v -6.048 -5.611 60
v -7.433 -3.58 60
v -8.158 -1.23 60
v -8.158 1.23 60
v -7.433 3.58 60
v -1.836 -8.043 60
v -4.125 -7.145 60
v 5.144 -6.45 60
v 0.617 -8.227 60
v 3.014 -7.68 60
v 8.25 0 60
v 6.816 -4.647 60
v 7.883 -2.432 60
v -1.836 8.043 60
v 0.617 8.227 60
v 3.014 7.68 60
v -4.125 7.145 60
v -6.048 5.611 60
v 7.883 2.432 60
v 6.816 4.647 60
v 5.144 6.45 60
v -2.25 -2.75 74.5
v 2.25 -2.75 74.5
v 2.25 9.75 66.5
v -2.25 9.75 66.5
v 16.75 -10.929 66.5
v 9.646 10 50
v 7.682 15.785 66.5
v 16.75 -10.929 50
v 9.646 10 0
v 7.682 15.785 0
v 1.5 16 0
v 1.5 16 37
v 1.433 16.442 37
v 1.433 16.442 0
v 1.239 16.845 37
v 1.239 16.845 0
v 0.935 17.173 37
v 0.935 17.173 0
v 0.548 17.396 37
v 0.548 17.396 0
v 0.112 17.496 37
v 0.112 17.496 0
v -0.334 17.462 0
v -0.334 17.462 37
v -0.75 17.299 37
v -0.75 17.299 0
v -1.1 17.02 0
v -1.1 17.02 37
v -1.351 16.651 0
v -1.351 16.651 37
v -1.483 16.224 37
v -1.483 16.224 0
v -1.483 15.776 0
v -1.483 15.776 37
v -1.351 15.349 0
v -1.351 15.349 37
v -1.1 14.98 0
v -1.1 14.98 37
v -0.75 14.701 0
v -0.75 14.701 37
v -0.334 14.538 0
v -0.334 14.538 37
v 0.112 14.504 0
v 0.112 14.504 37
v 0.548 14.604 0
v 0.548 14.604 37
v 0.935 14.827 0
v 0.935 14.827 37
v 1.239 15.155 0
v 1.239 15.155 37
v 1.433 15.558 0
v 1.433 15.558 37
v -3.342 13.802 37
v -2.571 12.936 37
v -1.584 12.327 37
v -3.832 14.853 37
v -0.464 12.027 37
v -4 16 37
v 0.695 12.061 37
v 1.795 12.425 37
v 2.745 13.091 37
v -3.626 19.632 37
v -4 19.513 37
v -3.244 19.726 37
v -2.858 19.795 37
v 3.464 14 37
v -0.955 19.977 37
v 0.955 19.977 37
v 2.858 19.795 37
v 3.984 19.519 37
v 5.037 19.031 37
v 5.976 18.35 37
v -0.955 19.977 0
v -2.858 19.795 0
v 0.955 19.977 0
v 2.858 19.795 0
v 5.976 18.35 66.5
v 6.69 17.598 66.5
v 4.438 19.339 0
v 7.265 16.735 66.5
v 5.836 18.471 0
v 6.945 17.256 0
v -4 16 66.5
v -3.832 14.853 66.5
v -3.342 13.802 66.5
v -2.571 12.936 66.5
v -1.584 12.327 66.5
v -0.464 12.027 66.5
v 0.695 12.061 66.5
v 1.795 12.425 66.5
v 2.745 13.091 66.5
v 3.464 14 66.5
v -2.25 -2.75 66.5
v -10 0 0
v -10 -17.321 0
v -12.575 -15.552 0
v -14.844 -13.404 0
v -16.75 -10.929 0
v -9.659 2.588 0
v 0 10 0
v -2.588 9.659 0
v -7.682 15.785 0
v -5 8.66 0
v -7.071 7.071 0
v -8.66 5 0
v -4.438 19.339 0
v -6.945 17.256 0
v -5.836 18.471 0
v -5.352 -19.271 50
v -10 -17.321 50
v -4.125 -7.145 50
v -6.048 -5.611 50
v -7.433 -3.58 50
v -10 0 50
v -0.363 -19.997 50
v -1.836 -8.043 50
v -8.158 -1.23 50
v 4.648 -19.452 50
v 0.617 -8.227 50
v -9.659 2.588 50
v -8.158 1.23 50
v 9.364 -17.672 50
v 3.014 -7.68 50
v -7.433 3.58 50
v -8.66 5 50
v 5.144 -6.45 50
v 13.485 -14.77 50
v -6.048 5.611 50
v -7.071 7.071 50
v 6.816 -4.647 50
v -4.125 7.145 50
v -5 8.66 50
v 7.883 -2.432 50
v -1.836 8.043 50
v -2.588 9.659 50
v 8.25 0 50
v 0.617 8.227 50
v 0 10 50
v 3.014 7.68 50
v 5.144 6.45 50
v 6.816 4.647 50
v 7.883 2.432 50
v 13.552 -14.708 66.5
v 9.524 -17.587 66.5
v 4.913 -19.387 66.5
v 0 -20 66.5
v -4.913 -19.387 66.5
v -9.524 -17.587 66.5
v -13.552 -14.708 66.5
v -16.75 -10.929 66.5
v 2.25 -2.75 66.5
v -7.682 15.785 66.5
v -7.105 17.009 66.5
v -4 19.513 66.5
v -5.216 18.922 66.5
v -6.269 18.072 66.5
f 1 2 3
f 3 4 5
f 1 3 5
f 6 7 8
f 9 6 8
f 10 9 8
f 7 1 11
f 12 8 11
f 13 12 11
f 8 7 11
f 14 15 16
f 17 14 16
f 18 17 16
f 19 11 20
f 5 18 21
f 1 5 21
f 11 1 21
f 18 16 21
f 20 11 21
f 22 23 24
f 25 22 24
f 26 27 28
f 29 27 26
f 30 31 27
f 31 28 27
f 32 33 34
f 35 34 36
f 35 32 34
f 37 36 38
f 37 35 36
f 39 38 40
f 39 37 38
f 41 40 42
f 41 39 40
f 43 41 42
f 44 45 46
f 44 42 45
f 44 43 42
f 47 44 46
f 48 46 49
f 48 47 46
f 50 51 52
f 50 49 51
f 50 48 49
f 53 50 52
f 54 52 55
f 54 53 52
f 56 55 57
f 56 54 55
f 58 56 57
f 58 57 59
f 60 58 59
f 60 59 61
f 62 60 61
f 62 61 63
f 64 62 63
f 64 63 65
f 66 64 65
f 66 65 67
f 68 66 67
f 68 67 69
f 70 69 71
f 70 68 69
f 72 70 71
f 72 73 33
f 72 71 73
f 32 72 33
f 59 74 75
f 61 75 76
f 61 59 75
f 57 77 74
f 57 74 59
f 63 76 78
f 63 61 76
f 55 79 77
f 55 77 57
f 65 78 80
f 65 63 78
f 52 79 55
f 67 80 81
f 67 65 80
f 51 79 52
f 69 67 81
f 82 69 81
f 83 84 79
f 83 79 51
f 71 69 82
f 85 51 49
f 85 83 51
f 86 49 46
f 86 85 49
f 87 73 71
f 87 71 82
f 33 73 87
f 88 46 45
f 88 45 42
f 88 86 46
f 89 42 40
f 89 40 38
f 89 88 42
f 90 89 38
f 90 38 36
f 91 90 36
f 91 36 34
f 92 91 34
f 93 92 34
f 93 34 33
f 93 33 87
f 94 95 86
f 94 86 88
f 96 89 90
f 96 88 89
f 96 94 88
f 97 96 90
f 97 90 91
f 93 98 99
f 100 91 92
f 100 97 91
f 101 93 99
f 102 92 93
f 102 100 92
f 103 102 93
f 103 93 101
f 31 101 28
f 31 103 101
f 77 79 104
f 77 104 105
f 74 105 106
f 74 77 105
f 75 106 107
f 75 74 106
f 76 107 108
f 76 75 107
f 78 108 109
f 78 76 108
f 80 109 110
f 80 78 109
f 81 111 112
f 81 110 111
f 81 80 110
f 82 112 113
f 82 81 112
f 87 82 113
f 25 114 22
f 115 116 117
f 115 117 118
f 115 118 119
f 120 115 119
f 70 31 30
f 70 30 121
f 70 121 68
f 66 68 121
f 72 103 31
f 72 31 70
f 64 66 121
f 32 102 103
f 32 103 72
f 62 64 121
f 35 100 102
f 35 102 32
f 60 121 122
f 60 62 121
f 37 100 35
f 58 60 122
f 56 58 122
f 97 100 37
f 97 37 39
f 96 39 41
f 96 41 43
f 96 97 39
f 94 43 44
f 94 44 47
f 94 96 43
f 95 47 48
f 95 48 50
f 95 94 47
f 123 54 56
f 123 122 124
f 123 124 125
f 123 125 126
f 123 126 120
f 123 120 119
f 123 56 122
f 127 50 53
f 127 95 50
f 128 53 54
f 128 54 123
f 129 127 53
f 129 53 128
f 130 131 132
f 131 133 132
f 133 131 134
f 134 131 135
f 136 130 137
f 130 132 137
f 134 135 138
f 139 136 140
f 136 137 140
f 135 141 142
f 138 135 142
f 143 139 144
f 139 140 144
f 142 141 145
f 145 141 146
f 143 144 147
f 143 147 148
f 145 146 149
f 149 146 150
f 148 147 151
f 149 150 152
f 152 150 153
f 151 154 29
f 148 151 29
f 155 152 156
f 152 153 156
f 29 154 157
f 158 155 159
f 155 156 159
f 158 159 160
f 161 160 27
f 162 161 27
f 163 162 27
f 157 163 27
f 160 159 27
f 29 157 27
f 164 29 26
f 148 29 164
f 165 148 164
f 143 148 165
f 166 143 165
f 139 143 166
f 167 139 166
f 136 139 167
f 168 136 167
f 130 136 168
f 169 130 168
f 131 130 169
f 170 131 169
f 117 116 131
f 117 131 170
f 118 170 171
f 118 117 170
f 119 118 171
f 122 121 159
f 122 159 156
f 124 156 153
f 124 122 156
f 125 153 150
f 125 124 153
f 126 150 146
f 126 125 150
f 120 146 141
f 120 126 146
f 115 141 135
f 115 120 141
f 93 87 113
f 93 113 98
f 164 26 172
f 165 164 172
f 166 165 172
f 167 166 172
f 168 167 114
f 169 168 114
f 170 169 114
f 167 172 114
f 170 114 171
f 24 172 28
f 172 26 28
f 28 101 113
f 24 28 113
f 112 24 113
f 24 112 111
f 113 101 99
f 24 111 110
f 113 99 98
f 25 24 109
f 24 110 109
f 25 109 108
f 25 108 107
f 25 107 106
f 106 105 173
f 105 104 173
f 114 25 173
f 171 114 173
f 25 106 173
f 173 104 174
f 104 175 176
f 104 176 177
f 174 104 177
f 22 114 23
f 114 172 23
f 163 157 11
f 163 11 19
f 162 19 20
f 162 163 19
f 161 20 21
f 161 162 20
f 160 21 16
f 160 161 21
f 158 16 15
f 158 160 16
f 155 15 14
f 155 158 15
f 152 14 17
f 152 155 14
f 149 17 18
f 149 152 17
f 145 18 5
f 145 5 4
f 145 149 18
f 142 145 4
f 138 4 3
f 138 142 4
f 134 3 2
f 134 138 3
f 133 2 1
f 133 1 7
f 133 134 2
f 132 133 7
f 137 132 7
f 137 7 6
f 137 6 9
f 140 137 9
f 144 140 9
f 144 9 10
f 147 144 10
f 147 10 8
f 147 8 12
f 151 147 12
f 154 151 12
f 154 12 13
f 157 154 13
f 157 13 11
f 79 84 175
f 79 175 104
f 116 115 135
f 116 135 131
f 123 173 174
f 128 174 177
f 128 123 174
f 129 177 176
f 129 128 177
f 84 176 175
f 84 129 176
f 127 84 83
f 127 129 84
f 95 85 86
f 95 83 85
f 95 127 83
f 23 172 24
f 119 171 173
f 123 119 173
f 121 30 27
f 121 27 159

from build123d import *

# Parameters (mm, degrees)
SKETCH_1_R               = 1.5
EXTRUDE_1_DEPTH          = 66.5
CUT_EXTRUDE_1_DEPTH      = 72.43397301
CUT_EXTRUDE_1_DEPTH_BACK = 29.5
CUT_EXTRUDE_2_DEPTH      = 50
SKETCH_1_4_R             = 8.25
CUT_EXTRUDE_3_DEPTH      = 60
EXTRUDE_2_DEPTH          = 2.25


with BuildPart() as part:
    # 草图1 → 凸台-拉伸1 (new body)
    with BuildSketch(Plane.XY):
        with BuildLine():
            Line((-7.681906247, 15.784996271), (-16.75, -10.928746497))
            ThreePointArc((-16.75, -10.928746497), (0, -20), (16.75, -10.928746497))
            Line((16.75, -10.928746497), (7.681906247, 15.784996271))
            ThreePointArc((7.681906247, 15.784996271), (5.835532469, 18.470596932), (2.857607815, 19.794799256))
            ThreePointArc((2.857607815, 19.794799256), (0, 20), (-2.857607815, 19.794799256))
            ThreePointArc((-2.857607815, 19.794799256), (-5.835532469, 18.470596932), (-7.681906247, 15.784996271))
        make_face()
        with Locations((0, 16)):
            Circle(SKETCH_1_R, mode=Mode.SUBTRACT)
    extrude(amount=EXTRUDE_1_DEPTH)

    # 草图2 → 切除-拉伸1 (cut, two sides: drawn at the far end of the back side and taken through both)
    with BuildSketch(Plane.XY.offset(66.5).offset(-CUT_EXTRUDE_1_DEPTH_BACK)):
        with BuildLine():
            Line((3.464101615, 14), (5.975770193, 18.350337589))
            ThreePointArc((5.975770193, 18.350337589), (4.522314785, 19.300583014), (2.857607815, 19.794799256))
            ThreePointArc((2.857607815, 19.794799256), (0, 20), (-2.857607815, 19.794799256))
            ThreePointArc((-2.857607815, 19.794799256), (-3.435719859, 19.682133501), (-4, 19.513328789))
            Line((-4, 19.513328789), (-4, 16))
            ThreePointArc((-4, 16), (-1.03527618, 12.136296695), (3.464101615, 14))
        make_face()
    extrude(amount=CUT_EXTRUDE_1_DEPTH + CUT_EXTRUDE_1_DEPTH_BACK, mode=Mode.SUBTRACT)

    # 草图1<3> → 切除-拉伸2 (cut)
    with BuildSketch(Plane.XY):
        with BuildLine():
            Line((-10, 0), (-10, -17.320508076))
            ThreePointArc((-10, -17.320508076), (4.648040342, -19.452396279), (16.75, -10.928746497))
            Line((16.75, -10.928746497), (9.645647869, 10))
            Line((9.645647869, 10), (0, 10))
            ThreePointArc((0, 10), (-7.071067812, 7.071067812), (-10, 0))
        make_face()
    extrude(amount=CUT_EXTRUDE_2_DEPTH, mode=Mode.SUBTRACT)

    # 草图1<4> → 切除-拉伸3 (cut)
    with BuildSketch(Plane.XY):
        Circle(SKETCH_1_4_R)
    extrude(amount=CUT_EXTRUDE_3_DEPTH, mode=Mode.SUBTRACT)

    # 草图3 → 凸台-拉伸2 (add, symmetric)
    with BuildSketch(Plane(origin=(0, 0, 0), x_dir=(0, 0, -1), z_dir=(1, 0, 0))):
        Polygon((-66.5, 9.75), (-66.5, -2.75), (-74.5, -2.75), align=None)
    extrude(amount=EXTRUDE_2_DEPTH, both=True)


solid = part.part
